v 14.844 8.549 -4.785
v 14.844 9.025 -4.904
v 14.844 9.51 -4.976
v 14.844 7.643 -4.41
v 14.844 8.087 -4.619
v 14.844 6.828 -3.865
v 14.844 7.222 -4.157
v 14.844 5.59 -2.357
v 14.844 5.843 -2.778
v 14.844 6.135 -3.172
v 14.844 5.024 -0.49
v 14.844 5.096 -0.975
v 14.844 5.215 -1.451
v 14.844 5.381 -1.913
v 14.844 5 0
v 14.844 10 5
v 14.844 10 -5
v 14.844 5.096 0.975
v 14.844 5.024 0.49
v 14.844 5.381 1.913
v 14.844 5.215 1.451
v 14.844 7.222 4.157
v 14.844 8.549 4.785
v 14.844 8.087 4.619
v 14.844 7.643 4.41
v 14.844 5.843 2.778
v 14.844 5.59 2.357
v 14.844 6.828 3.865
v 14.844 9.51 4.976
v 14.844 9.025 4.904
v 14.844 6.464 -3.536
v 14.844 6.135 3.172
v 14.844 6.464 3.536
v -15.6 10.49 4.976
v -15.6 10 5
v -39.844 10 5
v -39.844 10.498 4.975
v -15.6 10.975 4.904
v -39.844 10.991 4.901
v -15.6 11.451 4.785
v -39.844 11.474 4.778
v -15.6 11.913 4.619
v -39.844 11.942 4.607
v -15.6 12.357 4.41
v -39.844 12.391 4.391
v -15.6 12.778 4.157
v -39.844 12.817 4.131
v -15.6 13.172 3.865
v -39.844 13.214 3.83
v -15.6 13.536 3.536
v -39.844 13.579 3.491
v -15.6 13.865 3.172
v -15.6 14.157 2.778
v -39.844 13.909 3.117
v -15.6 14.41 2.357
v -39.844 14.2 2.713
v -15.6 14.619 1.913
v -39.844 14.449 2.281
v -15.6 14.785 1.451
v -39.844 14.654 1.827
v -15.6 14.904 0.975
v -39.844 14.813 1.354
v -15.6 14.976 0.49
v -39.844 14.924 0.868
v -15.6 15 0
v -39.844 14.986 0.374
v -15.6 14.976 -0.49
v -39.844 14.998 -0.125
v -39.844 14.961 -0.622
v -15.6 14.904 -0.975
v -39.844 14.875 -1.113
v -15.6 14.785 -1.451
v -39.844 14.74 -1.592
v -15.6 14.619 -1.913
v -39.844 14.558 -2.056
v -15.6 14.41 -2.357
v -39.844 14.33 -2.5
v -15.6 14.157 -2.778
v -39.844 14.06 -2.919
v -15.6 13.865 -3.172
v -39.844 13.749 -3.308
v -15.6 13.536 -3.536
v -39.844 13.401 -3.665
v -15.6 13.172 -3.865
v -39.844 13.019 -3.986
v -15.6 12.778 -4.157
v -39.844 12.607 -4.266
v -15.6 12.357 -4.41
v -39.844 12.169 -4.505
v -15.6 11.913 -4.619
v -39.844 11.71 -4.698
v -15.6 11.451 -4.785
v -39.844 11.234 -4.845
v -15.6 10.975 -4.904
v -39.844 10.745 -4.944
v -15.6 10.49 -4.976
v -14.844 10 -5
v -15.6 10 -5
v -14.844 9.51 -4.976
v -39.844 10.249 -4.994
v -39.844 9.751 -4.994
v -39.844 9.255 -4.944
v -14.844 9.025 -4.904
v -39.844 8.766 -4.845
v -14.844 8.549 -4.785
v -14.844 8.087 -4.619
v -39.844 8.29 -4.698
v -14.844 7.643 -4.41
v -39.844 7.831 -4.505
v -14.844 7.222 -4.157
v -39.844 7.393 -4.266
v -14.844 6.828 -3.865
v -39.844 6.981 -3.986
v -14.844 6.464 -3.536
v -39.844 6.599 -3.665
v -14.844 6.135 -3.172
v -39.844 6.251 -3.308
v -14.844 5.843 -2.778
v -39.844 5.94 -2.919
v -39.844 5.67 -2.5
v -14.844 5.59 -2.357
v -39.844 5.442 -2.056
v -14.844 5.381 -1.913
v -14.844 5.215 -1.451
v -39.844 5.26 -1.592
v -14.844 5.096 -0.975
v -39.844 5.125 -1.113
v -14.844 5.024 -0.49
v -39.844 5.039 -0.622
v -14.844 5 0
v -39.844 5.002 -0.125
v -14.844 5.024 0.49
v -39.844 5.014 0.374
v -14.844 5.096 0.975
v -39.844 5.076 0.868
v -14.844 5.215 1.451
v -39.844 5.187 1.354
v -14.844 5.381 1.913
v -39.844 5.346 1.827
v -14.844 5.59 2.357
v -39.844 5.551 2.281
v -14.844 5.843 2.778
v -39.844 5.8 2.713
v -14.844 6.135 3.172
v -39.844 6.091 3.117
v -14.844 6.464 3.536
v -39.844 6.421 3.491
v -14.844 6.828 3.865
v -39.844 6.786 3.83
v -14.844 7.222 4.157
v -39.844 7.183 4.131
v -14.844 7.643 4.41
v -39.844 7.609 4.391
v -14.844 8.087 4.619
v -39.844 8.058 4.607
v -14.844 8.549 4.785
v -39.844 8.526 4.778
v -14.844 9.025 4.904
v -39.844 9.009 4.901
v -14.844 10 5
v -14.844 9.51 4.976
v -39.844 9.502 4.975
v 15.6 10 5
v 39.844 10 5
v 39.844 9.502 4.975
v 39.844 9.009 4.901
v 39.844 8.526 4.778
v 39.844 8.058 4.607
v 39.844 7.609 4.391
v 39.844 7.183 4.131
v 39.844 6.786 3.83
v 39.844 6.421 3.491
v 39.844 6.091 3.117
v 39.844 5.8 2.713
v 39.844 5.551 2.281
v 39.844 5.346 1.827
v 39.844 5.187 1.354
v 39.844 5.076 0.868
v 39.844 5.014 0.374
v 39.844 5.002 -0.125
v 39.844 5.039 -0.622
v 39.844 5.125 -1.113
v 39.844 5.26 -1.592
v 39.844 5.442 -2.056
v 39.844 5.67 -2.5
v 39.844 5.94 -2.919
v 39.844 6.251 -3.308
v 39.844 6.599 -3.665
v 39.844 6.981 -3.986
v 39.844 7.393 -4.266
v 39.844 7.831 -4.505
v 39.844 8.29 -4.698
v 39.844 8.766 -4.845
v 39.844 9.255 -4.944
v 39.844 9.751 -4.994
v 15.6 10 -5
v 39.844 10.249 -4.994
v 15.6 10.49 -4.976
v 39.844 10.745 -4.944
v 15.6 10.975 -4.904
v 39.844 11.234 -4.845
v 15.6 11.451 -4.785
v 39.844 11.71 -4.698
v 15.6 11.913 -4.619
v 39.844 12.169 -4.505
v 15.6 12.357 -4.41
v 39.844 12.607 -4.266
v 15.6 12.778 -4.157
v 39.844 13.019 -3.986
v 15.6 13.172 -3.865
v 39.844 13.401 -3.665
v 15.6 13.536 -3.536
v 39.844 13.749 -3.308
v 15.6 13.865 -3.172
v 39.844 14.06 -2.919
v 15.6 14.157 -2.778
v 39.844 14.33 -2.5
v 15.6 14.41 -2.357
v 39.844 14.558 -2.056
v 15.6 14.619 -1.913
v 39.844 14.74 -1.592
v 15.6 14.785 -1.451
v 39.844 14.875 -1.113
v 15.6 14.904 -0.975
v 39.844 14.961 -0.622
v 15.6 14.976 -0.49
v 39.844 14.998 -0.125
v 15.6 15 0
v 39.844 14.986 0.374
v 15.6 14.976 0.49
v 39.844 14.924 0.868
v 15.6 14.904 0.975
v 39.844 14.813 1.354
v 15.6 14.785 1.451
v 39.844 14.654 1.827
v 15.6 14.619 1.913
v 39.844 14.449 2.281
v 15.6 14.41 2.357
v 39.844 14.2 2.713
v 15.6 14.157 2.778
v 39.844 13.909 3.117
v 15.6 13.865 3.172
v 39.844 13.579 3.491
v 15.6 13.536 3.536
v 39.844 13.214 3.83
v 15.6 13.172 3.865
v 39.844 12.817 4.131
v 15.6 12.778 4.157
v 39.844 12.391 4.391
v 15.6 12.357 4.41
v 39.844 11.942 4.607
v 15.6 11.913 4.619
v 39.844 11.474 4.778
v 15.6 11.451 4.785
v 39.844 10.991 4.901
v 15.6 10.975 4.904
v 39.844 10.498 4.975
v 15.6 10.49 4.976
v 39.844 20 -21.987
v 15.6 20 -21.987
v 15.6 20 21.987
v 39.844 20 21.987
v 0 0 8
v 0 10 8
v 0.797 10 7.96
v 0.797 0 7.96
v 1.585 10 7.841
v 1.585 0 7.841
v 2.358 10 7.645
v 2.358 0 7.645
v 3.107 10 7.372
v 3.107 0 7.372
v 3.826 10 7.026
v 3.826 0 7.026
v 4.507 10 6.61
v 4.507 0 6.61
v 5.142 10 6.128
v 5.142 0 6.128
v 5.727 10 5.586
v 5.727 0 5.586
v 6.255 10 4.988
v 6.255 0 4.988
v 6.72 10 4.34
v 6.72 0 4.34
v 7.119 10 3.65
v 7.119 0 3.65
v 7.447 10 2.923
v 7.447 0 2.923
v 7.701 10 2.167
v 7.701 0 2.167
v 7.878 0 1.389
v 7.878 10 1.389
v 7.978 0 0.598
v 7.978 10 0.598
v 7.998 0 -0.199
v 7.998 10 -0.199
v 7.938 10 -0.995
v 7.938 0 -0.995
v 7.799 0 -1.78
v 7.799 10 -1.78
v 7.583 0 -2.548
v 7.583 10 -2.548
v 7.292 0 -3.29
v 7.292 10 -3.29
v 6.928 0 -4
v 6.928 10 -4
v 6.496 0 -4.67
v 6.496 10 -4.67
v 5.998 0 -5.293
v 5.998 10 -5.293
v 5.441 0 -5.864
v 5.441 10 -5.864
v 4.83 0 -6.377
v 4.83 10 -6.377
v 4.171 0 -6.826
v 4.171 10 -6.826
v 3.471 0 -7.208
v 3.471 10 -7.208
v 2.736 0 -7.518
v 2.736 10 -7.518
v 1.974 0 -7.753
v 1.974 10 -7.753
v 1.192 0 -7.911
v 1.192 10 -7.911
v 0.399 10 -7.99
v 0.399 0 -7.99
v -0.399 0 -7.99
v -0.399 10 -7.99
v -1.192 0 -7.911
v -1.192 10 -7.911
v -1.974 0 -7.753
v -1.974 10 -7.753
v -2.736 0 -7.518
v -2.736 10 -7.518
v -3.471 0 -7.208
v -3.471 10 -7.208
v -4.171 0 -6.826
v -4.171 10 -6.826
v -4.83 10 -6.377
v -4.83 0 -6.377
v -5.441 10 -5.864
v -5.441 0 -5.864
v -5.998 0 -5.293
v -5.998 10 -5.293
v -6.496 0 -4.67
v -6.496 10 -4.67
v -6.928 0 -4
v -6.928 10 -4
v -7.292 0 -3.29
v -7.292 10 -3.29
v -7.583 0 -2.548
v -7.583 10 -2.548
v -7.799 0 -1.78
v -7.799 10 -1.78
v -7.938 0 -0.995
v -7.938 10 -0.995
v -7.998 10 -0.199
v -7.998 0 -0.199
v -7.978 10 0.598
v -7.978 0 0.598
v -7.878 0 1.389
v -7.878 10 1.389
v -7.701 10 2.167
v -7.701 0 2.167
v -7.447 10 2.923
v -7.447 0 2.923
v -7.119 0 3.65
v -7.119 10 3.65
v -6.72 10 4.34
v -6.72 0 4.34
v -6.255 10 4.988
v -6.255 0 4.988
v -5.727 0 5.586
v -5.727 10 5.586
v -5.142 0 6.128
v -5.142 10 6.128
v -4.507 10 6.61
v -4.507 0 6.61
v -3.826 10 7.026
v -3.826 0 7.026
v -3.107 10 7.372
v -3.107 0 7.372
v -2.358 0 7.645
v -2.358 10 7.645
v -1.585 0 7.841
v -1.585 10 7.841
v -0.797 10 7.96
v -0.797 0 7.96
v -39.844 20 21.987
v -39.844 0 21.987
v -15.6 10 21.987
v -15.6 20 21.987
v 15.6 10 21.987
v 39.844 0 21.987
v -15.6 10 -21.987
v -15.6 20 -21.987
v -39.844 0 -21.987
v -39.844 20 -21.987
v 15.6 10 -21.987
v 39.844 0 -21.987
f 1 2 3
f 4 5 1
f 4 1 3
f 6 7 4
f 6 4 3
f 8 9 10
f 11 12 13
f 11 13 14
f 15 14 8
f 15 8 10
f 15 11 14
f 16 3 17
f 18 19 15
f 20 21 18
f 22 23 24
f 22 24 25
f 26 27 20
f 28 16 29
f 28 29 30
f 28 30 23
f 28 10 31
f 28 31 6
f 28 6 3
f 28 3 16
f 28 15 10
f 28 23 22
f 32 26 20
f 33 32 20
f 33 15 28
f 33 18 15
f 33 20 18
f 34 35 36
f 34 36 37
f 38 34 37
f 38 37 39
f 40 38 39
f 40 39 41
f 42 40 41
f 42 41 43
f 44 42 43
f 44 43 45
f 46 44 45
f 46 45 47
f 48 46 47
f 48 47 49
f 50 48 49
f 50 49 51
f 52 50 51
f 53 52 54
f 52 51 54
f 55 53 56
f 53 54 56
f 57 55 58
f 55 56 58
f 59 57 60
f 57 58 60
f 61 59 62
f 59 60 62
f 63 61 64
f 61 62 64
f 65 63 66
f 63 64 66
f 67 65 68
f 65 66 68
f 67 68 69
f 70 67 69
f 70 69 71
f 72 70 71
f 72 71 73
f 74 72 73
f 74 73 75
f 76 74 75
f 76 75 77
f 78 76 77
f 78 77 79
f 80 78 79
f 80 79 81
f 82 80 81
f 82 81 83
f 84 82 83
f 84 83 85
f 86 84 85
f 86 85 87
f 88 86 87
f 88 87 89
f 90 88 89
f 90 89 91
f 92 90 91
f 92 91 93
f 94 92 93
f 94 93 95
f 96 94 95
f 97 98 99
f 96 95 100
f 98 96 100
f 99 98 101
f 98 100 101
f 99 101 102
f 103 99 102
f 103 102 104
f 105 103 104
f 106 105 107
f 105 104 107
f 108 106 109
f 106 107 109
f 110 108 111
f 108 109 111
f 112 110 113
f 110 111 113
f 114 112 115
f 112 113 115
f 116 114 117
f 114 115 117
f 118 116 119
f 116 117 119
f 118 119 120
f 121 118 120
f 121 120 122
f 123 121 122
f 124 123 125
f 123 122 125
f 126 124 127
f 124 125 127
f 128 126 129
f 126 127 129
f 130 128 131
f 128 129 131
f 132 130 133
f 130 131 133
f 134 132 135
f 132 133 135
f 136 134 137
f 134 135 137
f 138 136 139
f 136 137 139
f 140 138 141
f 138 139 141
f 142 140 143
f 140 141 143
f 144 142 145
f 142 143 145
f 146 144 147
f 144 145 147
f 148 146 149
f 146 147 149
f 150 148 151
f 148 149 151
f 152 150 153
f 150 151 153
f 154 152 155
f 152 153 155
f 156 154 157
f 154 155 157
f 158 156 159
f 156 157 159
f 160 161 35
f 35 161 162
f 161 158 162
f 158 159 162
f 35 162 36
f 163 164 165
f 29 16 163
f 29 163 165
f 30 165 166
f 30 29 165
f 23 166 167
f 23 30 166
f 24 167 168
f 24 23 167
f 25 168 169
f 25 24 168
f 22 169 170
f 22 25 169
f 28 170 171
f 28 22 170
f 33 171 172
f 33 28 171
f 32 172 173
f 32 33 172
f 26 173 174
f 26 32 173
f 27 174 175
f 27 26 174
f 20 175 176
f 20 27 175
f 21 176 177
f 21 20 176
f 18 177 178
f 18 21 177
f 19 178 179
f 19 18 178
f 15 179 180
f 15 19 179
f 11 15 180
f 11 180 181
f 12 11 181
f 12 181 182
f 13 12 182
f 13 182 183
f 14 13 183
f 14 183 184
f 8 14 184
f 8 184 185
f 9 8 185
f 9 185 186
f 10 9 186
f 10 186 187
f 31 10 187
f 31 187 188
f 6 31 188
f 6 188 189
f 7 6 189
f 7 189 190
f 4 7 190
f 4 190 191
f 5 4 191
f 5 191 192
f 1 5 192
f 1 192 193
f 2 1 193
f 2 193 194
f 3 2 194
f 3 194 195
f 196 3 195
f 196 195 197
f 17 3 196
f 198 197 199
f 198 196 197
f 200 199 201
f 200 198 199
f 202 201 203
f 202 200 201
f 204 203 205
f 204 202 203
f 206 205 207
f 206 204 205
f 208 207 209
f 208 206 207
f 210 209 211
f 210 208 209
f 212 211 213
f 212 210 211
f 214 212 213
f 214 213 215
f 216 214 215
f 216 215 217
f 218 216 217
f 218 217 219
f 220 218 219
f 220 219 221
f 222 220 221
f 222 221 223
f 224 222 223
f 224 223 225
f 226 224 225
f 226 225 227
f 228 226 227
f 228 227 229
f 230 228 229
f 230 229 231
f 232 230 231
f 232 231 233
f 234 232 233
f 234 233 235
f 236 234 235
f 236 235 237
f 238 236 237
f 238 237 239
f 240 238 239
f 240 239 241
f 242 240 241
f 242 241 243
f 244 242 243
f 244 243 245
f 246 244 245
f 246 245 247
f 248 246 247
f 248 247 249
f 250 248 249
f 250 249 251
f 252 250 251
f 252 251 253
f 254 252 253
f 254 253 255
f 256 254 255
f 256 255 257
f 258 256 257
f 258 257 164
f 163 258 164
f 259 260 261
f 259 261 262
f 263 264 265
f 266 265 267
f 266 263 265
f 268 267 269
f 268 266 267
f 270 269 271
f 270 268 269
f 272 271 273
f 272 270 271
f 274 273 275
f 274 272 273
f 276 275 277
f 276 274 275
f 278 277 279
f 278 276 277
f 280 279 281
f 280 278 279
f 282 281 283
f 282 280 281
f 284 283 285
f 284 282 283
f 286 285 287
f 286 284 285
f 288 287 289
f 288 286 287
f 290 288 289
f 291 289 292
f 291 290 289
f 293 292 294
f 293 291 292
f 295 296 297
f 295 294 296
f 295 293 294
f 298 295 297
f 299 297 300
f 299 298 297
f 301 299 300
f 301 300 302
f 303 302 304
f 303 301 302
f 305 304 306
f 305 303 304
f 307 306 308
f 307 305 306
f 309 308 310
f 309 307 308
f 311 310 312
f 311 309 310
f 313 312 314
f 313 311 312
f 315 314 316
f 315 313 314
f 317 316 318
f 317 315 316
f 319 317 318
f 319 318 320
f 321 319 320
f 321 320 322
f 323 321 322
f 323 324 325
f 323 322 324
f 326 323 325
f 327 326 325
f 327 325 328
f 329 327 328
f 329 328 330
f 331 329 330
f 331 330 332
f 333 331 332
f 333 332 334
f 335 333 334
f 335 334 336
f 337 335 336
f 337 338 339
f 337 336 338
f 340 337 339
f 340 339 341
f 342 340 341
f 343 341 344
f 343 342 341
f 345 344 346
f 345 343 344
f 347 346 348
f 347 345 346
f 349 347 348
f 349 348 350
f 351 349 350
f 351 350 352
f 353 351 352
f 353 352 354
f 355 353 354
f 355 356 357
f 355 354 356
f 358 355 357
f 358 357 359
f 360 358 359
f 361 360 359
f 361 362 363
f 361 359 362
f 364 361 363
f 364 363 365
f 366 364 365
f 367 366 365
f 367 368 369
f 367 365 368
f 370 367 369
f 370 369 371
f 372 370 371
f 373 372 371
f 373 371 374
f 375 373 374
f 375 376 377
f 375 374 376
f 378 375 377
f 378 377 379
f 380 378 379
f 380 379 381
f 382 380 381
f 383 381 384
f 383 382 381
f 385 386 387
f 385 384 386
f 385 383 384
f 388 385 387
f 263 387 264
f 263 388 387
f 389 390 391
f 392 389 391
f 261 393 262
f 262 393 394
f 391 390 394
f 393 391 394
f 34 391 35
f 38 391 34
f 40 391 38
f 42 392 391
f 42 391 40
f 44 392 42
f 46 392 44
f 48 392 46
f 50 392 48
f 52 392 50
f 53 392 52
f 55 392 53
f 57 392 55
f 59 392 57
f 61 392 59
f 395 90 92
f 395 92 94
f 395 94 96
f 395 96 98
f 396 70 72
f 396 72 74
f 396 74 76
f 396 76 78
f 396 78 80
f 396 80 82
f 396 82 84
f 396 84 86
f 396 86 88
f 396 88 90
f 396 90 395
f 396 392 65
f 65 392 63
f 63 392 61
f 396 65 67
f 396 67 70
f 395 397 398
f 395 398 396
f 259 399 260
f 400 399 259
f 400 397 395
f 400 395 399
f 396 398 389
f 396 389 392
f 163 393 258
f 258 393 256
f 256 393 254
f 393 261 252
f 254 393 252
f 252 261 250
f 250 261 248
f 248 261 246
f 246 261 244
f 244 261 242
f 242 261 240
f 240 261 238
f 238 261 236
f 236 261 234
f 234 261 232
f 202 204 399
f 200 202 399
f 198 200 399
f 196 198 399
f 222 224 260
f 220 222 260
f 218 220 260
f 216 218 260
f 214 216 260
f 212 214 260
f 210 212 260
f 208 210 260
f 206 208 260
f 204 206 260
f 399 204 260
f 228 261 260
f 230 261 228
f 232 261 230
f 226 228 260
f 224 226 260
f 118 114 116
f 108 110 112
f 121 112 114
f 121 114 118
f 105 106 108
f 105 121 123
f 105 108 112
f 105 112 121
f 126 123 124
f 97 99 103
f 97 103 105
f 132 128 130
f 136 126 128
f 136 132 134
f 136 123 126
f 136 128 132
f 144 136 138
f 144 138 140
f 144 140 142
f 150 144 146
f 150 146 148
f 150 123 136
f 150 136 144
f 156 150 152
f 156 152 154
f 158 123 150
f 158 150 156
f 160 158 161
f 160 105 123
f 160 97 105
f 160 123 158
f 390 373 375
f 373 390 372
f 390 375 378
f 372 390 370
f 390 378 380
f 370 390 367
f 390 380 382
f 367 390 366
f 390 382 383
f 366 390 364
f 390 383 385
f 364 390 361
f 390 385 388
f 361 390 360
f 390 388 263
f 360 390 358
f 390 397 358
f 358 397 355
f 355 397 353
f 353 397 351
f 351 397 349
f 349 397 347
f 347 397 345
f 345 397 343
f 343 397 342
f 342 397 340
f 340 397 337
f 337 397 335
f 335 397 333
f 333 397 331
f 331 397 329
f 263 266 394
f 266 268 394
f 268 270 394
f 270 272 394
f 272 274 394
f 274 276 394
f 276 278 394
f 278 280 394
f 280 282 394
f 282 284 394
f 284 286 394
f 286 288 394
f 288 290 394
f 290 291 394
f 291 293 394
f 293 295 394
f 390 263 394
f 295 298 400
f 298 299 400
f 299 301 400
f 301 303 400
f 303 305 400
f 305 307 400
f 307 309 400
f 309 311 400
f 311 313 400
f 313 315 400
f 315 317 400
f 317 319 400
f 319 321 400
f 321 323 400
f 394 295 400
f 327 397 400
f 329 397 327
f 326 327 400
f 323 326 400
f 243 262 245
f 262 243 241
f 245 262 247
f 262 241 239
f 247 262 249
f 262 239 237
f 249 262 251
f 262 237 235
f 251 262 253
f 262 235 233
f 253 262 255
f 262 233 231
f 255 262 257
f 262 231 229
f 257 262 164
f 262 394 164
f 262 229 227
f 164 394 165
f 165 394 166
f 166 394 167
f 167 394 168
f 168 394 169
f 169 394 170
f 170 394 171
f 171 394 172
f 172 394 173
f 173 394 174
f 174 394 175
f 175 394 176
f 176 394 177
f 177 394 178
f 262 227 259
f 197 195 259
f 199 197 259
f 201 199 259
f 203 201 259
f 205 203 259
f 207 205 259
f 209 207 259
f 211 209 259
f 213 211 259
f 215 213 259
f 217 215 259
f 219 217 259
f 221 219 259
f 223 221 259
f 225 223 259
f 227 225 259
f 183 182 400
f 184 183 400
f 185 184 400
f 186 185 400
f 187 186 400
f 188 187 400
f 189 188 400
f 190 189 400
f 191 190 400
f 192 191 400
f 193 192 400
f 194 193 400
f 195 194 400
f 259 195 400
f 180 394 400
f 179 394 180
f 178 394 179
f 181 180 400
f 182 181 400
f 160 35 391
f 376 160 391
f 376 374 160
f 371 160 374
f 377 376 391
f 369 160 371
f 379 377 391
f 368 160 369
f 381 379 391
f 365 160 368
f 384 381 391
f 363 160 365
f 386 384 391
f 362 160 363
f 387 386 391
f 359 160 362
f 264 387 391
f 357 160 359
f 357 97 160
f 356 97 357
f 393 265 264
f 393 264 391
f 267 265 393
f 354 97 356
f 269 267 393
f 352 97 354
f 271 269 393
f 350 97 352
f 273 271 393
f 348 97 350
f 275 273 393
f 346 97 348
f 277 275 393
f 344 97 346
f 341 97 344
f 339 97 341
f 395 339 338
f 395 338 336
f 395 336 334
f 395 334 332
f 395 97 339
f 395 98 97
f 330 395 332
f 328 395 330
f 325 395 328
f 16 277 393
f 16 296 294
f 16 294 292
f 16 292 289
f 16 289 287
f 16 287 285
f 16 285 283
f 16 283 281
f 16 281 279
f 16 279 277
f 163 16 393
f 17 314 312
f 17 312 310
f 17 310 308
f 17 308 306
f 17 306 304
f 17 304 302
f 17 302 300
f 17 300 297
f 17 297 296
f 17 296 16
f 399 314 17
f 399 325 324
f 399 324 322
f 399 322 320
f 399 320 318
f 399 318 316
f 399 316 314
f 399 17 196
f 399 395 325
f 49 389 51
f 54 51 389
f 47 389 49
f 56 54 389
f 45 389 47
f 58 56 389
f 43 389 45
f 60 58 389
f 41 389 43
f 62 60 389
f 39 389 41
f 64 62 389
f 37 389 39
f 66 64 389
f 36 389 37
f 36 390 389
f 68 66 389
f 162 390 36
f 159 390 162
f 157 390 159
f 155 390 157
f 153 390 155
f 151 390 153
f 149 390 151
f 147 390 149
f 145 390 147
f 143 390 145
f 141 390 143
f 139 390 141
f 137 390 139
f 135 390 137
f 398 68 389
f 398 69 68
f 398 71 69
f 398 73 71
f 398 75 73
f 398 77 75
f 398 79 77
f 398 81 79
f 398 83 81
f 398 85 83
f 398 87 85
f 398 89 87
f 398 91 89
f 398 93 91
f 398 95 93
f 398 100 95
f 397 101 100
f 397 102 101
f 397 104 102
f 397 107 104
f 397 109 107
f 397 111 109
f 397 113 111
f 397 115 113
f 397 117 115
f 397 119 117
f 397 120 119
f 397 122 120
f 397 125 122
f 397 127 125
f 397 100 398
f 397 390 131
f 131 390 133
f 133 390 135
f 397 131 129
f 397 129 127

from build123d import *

# Parameters (mm, degrees)
SKETCH_1_W          = 79.688684702
SKETCH_1_H          = 43.973938876
SKETCH_1_R          = 8
EXTRUDE_1_DEPTH     = 20
SKETCH_2_R          = 5
CUT_EXTRUDE_2_DEPTH = 25
CUT_EXTRUDE_START   = -25
SKETCH_3_R          = 5
CUT_EXTRUDE_3_DEPTH = 25
SKETCH_4_W          = 31.2
SKETCH_4_H          = 50
CUT_EXTRUDE_4_DEPTH = 10


with BuildPart() as part:
    # Эскиз1 → Вытянуть1 (new body)
    with BuildSketch(Plane(origin=(0, 0, 0), x_dir=(1, 0, 0), z_dir=(0, 1, 0))):
        Rectangle(SKETCH_1_W, SKETCH_1_H)
        with Locations(Location((0, 0, 0), (0, 0, 270))):
            Circle(SKETCH_1_R, mode=Mode.SUBTRACT)
    extrude(amount=EXTRUDE_1_DEPTH)

    # Эскиз2 → Вытянуть2 (cut)
    with BuildSketch(Plane.ZY.offset(39.844342351)):
        with Locations((0, 10)):
            Circle(SKETCH_2_R)
    extrude(amount=-CUT_EXTRUDE_2_DEPTH, mode=Mode.SUBTRACT)

    # Эскиз3 → Вытянуть3 (cut)
    with BuildSketch(Plane(origin=(39.844342351, 0, 0), x_dir=(0, 0, -1), z_dir=(1, 0, 0)).offset(CUT_EXTRUDE_START)):
        with Locations(Location((0, 10, 0), (0, 0, 180))):
            Circle(SKETCH_3_R)
    extrude(amount=CUT_EXTRUDE_3_DEPTH, mode=Mode.SUBTRACT)

    # Эскиз4 → Вытянуть4 (cut)
    with BuildSketch(Plane(origin=(0, 20, 0), x_dir=(1, 0, 0), z_dir=(0, 1, 0))):
        Rectangle(SKETCH_4_W, SKETCH_4_H)
    extrude(amount=-CUT_EXTRUDE_4_DEPTH, mode=Mode.SUBTRACT)


solid = part.part
